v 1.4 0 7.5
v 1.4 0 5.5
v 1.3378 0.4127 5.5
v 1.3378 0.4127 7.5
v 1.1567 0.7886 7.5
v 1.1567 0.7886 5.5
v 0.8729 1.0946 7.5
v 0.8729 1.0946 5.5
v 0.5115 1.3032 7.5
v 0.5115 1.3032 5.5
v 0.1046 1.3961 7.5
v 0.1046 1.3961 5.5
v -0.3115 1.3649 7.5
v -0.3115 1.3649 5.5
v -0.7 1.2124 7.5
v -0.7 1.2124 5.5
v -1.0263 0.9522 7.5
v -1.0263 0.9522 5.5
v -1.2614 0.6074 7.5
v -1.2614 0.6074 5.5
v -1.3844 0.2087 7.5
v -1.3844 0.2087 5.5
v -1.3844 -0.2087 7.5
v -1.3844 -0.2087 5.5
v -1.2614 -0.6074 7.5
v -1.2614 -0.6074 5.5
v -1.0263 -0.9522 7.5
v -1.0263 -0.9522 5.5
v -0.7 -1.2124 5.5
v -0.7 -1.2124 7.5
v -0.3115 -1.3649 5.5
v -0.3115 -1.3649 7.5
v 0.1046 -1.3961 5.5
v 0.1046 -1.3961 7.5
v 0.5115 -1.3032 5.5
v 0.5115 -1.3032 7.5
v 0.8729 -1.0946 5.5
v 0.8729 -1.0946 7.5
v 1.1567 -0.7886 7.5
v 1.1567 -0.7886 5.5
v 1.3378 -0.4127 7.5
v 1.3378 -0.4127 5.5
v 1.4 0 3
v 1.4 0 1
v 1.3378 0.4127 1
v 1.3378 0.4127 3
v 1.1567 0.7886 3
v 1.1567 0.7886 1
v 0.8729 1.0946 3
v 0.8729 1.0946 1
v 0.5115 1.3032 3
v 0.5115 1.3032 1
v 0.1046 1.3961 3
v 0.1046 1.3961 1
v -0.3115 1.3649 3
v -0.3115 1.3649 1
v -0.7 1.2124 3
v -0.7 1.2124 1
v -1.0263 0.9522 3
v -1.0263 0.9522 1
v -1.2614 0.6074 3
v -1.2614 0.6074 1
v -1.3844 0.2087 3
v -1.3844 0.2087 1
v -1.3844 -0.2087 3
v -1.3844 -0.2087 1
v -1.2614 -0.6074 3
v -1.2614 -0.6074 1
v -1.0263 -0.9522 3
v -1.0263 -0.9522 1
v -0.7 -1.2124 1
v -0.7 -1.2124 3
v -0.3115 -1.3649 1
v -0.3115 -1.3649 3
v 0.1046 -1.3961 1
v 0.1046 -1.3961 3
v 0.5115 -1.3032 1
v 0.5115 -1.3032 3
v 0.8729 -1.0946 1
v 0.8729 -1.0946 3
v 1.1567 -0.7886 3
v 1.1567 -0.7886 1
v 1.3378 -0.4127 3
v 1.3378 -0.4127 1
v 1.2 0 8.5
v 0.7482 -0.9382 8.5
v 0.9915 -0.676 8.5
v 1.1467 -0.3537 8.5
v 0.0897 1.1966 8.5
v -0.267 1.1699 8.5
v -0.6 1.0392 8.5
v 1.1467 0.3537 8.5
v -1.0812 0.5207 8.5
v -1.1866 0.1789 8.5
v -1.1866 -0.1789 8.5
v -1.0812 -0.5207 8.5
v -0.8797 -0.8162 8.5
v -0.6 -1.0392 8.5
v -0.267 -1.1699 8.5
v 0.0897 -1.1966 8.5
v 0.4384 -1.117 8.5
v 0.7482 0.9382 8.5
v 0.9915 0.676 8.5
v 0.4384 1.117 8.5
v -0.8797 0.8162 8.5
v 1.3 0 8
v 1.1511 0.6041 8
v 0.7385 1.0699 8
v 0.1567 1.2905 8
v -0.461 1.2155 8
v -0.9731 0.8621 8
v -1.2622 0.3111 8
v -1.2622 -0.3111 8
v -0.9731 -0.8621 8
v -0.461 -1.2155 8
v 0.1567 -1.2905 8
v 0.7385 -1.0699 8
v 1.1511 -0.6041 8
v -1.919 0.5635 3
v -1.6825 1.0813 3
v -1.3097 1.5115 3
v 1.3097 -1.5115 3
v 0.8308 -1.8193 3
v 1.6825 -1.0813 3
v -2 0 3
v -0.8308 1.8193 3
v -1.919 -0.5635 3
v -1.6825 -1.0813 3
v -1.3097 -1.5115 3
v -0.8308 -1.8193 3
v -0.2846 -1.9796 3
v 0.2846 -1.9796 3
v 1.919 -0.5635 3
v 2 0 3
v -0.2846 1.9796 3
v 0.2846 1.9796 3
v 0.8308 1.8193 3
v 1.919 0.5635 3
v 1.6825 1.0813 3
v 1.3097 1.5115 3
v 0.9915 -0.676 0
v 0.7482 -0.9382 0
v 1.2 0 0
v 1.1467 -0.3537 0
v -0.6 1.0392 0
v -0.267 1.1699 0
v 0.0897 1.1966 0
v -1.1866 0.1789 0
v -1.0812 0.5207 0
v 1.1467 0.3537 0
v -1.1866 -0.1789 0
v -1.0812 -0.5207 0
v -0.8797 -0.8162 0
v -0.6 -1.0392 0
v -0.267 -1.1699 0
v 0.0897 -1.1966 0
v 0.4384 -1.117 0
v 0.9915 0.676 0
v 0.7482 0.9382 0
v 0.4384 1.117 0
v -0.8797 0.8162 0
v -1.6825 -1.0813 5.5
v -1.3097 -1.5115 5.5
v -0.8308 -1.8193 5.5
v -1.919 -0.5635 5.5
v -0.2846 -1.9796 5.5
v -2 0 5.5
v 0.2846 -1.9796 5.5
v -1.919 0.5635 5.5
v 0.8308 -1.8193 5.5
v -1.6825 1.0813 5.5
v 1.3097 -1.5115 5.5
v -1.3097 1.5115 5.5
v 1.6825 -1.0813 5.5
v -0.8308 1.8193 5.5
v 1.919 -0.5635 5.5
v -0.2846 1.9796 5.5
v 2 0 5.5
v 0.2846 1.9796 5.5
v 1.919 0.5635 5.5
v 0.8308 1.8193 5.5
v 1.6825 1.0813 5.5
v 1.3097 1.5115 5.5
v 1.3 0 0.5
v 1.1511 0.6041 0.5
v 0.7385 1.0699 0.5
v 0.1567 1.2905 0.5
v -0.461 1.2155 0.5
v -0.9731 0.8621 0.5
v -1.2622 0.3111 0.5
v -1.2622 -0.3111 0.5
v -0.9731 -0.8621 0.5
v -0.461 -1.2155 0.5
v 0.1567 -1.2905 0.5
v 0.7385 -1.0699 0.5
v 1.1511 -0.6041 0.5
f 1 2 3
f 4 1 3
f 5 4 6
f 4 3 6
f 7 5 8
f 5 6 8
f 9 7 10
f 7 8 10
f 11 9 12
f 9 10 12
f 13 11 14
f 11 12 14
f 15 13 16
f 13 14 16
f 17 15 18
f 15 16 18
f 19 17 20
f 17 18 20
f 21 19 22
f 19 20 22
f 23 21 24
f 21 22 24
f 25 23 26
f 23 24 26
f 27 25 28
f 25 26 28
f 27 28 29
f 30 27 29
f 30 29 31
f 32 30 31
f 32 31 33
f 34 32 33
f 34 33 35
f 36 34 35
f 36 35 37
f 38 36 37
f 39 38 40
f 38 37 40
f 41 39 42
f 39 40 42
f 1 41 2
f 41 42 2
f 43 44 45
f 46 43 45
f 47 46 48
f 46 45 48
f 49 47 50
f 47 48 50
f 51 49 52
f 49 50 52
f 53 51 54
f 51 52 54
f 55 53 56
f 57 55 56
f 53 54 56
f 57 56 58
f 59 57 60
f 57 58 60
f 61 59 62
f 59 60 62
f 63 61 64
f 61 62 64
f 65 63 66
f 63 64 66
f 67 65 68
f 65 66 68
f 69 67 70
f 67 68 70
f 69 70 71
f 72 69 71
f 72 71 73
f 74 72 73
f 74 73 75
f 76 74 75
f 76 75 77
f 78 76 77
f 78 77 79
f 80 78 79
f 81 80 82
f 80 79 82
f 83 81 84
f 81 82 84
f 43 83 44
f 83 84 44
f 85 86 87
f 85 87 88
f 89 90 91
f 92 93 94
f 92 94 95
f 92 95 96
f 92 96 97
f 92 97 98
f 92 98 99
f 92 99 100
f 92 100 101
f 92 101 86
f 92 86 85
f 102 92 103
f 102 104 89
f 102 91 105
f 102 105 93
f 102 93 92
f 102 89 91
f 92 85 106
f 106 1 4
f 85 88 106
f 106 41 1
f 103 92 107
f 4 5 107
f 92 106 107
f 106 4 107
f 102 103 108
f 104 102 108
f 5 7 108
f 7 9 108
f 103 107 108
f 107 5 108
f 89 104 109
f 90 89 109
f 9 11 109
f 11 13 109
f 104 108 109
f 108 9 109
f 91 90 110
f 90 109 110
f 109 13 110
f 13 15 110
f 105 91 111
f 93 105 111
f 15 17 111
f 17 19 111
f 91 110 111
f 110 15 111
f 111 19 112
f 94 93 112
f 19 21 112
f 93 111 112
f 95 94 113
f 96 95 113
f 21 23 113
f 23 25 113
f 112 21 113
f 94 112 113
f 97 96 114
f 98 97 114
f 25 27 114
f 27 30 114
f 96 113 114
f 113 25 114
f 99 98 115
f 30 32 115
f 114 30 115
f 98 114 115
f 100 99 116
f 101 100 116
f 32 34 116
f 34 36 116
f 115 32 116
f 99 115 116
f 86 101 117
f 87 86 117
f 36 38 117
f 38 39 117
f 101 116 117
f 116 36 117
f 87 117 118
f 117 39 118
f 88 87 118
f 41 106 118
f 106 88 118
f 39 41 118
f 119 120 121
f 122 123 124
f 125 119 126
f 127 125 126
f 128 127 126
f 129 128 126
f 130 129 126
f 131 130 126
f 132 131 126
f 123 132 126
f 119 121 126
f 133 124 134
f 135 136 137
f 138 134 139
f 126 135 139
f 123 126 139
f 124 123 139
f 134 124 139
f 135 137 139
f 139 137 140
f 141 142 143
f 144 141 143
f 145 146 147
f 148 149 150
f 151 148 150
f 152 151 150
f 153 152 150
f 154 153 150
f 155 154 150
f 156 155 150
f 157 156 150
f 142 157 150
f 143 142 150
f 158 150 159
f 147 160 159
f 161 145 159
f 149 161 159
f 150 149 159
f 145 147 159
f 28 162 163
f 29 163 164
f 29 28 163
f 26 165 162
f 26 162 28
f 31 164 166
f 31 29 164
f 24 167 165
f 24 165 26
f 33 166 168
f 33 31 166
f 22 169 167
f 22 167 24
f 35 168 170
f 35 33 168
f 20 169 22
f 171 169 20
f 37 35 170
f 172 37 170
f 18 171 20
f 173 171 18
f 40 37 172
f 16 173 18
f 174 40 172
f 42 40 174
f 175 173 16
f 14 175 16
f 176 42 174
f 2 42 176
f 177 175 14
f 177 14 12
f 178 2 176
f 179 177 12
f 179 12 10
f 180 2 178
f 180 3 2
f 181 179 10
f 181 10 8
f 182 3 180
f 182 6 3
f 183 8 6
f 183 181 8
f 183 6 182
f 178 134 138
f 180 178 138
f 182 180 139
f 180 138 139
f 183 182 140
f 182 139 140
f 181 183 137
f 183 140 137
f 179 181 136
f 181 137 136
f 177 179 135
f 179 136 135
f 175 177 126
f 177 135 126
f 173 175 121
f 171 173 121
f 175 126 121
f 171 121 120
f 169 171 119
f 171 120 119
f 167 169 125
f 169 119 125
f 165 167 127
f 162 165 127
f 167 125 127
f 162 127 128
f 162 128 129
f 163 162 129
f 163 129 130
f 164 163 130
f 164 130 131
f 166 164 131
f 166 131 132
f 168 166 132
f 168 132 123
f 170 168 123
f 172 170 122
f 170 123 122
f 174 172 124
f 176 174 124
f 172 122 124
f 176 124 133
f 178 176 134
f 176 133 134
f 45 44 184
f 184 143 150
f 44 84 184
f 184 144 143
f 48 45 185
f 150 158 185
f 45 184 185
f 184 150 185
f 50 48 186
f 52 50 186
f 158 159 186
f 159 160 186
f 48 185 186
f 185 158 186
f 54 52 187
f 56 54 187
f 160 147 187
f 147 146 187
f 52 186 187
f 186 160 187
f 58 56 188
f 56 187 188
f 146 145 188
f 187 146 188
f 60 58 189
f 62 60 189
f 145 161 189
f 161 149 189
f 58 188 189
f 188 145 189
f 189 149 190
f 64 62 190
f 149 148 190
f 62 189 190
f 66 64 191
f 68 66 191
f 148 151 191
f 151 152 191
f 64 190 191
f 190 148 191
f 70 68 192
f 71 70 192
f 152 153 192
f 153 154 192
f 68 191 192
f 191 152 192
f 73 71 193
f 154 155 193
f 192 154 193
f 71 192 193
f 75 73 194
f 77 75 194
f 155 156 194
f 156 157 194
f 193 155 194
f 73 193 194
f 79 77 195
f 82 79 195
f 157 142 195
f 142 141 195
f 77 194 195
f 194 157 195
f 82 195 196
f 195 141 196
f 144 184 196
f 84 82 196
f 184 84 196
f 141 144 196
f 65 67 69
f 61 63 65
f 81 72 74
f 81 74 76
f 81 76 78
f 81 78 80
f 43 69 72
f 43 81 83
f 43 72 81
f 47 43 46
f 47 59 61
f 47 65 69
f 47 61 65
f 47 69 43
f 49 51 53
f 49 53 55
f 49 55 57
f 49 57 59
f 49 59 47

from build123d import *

# Parameters (mm, degrees)
F0_R     = 1.4
F1_DEPTH = 3
F2_R     = 2
F2_R_2   = 1.4
F3_DEPTH = 2.5
F4_R     = 1.4
F5_DEPTH = 3
F6_SIZE2 = 1
F6_SIZE  = 0.2
F7_SIZE2 = 0.2
F7_SIZE  = 1


with BuildPart() as f1:
    # F0 (on Top) → F1 (new body)
    with BuildSketch(Plane.XY):
        Circle(F0_R)
    extrude(amount=F1_DEPTH)

    # F7
    f7_edges = [f1.edges().sort_by_distance(p)[0] for p in [
        (-1.4, 0, 0),
    ]]
    f7_side = f1.faces().sort_by_distance((-1.4, 0, 1.5))[0]
    chamfer(f7_edges, length=F7_SIZE, length2=F7_SIZE2, reference=f7_side)


with BuildPart() as f3:
    # F2 (on face) → F3 (new body)
    with BuildSketch(Plane.XY.offset(3)):
        Circle(F2_R)
        Circle(F2_R_2, mode=Mode.SUBTRACT)
        Circle(F2_R_2)
    extrude(amount=F3_DEPTH)

    # F4 (on face) → F5 (join)
    with BuildSketch(Plane.XY.offset(5.5)):
        Circle(F4_R)
    extrude(amount=F5_DEPTH)

    # F6
    f6_edges = [f3.edges().sort_by_distance(p)[0] for p in [
        (-1.4, 0, 8.5),
    ]]
    f6_side = f3.faces().sort_by_distance((0, 0, 8.5))[0]
    chamfer(f6_edges, length=F6_SIZE, length2=F6_SIZE2, reference=f6_side)


solid = Compound([f1.part, f3.part])
